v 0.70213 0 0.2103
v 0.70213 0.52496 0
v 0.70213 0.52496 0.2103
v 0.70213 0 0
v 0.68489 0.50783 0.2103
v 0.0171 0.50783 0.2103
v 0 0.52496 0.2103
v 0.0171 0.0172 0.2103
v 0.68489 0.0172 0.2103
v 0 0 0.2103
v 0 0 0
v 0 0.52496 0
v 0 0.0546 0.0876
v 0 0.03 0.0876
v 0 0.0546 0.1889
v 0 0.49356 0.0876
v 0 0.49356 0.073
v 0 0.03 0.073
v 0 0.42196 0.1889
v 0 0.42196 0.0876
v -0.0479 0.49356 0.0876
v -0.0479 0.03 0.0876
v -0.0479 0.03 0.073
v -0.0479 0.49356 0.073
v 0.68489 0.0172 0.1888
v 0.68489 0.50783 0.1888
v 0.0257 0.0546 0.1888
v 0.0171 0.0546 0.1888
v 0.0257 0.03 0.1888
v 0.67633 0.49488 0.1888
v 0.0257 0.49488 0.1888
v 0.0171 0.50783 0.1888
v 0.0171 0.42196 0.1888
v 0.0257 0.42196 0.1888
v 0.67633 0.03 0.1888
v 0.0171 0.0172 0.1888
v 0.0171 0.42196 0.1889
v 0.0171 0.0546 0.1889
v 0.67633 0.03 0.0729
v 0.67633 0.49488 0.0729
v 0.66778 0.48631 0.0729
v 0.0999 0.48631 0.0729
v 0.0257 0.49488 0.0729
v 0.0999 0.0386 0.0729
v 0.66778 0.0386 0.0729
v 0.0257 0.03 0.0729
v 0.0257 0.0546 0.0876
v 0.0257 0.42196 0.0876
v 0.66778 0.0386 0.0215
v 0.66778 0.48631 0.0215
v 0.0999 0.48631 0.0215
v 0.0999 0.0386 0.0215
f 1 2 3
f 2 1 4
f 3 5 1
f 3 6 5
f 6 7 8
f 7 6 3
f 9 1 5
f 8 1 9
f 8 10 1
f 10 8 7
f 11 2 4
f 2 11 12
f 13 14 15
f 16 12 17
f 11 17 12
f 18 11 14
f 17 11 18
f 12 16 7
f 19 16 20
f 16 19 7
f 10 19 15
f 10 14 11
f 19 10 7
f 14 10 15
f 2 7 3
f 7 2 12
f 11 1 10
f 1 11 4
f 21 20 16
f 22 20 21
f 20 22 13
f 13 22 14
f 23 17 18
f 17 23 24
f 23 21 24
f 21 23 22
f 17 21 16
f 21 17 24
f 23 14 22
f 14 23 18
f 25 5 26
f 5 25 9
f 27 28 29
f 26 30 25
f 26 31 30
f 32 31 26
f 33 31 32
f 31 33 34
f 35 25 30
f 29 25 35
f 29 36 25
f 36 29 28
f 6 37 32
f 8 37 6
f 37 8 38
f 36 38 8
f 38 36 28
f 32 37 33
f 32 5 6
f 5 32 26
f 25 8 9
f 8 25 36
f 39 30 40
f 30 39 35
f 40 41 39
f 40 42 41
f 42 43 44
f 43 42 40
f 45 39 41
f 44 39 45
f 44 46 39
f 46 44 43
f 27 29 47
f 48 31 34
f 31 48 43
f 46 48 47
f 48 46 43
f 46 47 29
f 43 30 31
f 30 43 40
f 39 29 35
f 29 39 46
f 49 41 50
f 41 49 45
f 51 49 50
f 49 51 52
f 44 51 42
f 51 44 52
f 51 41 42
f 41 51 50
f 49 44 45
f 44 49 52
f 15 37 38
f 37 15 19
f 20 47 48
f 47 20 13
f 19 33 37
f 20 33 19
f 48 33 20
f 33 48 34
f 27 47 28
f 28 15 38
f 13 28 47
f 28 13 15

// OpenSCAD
// Parametric design for complex rectangular part with pockets, projection, and recess

// Main body dimensions
body_length   = 0.702127;
body_width    = 0.524964;
body_height   = 0.2103;   // top surface height

// Top shallow recess
top_recess_length    = 0.667793;
top_recess_width     = 0.490631;
top_recess_left_inset  = 0.0171;
top_recess_right_inset = 0.0172; // not directly used, but for reference
top_recess_front_inset = 0.0172;
top_recess_back_inset  = 0.0172; // reference
top_recess_z_bottom = 0.1888;
top_recess_z_top    = 0.2103;

// Middle pocket (continuation downward)
mid_pocket_length   = 0.650626;
mid_pocket_width    = 0.46488;
mid_pocket_left_inset  = 0.0257;
mid_pocket_right_inset = 0.0258; // reference
mid_pocket_front_inset = 0.03;
mid_pocket_back_inset  = 0.0301; // reference
mid_pocket_z_bottom = 0.0729;
mid_pocket_z_top    = 0.1888;

// Lower offset pocket
low_pocket_length   = 0.567882;
low_pocket_width    = 0.447713;
low_pocket_left_inset  = 0.0999;
low_pocket_right_inset = 0.0343; // reference
low_pocket_front_inset = 0.0386;
low_pocket_back_inset  = 0.0387; // reference
low_pocket_z_bottom = 0.0215;
low_pocket_z_top    = 0.073;

// Side projection (overhangs left edge)
proj_length   = 0.130618;   // x‑span
proj_width    = 0.463588;   // y‑span (computed from insets)
proj_overhang = 0.0479;     // how far it extends left of the body
proj_front_inset = 0.03;
proj_back_inset  = 0.0314;
proj_z_bottom = 0.073;
proj_z_top    = 0.0876;

// Side recess (cut on left face)
side_recess_depth   = 0.0343;
side_recess_front_inset = 0.0546;
side_recess_back_inset  = 0.103;
side_recess_z_bottom = 0.0876;
side_recess_z_top    = 0.1889;

// Resolution for curved surfaces (not needed here, but included)
$fn = 50;

// Modules for each feature

module main_body() {
    cube([body_length, body_width, body_height]);
}

module top_recess() {
    translate([top_recess_left_inset, top_recess_front_inset, top_recess_z_bottom])
        cube([top_recess_length, top_recess_width, top_recess_z_top - top_recess_z_bottom]);
}

module mid_pocket() {
    translate([mid_pocket_left_inset, mid_pocket_front_inset, mid_pocket_z_bottom])
        cube([mid_pocket_length, mid_pocket_width, mid_pocket_z_top - mid_pocket_z_bottom]);
}

module low_pocket() {
    translate([low_pocket_left_inset, low_pocket_front_inset, low_pocket_z_bottom])
        cube([low_pocket_length, low_pocket_width, low_pocket_z_top - low_pocket_z_bottom]);
}

module side_projection() {
    // Overhangs left edge: starts at -proj_overhang, spans proj_length
    translate([-proj_overhang, proj_front_inset, proj_z_bottom])
        cube([proj_length, body_width - proj_front_inset - proj_back_inset, proj_z_top - proj_z_bottom]);
}

module side_recess() {
    // Cut into left side from x=0 to side_recess_depth
    translate([0, side_recess_front_inset, side_recess_z_bottom])
        cube([side_recess_depth, body_width - side_recess_front_inset - side_recess_back_inset, side_recess_z_top - side_recess_z_bottom]);
}

// Final model: main body with projection, then subtract all pockets and side recess
difference() {
    union() {
        main_body();
        side_projection();
    }
    top_recess();
    mid_pocket();
    low_pocket();
    side_recess();
}
